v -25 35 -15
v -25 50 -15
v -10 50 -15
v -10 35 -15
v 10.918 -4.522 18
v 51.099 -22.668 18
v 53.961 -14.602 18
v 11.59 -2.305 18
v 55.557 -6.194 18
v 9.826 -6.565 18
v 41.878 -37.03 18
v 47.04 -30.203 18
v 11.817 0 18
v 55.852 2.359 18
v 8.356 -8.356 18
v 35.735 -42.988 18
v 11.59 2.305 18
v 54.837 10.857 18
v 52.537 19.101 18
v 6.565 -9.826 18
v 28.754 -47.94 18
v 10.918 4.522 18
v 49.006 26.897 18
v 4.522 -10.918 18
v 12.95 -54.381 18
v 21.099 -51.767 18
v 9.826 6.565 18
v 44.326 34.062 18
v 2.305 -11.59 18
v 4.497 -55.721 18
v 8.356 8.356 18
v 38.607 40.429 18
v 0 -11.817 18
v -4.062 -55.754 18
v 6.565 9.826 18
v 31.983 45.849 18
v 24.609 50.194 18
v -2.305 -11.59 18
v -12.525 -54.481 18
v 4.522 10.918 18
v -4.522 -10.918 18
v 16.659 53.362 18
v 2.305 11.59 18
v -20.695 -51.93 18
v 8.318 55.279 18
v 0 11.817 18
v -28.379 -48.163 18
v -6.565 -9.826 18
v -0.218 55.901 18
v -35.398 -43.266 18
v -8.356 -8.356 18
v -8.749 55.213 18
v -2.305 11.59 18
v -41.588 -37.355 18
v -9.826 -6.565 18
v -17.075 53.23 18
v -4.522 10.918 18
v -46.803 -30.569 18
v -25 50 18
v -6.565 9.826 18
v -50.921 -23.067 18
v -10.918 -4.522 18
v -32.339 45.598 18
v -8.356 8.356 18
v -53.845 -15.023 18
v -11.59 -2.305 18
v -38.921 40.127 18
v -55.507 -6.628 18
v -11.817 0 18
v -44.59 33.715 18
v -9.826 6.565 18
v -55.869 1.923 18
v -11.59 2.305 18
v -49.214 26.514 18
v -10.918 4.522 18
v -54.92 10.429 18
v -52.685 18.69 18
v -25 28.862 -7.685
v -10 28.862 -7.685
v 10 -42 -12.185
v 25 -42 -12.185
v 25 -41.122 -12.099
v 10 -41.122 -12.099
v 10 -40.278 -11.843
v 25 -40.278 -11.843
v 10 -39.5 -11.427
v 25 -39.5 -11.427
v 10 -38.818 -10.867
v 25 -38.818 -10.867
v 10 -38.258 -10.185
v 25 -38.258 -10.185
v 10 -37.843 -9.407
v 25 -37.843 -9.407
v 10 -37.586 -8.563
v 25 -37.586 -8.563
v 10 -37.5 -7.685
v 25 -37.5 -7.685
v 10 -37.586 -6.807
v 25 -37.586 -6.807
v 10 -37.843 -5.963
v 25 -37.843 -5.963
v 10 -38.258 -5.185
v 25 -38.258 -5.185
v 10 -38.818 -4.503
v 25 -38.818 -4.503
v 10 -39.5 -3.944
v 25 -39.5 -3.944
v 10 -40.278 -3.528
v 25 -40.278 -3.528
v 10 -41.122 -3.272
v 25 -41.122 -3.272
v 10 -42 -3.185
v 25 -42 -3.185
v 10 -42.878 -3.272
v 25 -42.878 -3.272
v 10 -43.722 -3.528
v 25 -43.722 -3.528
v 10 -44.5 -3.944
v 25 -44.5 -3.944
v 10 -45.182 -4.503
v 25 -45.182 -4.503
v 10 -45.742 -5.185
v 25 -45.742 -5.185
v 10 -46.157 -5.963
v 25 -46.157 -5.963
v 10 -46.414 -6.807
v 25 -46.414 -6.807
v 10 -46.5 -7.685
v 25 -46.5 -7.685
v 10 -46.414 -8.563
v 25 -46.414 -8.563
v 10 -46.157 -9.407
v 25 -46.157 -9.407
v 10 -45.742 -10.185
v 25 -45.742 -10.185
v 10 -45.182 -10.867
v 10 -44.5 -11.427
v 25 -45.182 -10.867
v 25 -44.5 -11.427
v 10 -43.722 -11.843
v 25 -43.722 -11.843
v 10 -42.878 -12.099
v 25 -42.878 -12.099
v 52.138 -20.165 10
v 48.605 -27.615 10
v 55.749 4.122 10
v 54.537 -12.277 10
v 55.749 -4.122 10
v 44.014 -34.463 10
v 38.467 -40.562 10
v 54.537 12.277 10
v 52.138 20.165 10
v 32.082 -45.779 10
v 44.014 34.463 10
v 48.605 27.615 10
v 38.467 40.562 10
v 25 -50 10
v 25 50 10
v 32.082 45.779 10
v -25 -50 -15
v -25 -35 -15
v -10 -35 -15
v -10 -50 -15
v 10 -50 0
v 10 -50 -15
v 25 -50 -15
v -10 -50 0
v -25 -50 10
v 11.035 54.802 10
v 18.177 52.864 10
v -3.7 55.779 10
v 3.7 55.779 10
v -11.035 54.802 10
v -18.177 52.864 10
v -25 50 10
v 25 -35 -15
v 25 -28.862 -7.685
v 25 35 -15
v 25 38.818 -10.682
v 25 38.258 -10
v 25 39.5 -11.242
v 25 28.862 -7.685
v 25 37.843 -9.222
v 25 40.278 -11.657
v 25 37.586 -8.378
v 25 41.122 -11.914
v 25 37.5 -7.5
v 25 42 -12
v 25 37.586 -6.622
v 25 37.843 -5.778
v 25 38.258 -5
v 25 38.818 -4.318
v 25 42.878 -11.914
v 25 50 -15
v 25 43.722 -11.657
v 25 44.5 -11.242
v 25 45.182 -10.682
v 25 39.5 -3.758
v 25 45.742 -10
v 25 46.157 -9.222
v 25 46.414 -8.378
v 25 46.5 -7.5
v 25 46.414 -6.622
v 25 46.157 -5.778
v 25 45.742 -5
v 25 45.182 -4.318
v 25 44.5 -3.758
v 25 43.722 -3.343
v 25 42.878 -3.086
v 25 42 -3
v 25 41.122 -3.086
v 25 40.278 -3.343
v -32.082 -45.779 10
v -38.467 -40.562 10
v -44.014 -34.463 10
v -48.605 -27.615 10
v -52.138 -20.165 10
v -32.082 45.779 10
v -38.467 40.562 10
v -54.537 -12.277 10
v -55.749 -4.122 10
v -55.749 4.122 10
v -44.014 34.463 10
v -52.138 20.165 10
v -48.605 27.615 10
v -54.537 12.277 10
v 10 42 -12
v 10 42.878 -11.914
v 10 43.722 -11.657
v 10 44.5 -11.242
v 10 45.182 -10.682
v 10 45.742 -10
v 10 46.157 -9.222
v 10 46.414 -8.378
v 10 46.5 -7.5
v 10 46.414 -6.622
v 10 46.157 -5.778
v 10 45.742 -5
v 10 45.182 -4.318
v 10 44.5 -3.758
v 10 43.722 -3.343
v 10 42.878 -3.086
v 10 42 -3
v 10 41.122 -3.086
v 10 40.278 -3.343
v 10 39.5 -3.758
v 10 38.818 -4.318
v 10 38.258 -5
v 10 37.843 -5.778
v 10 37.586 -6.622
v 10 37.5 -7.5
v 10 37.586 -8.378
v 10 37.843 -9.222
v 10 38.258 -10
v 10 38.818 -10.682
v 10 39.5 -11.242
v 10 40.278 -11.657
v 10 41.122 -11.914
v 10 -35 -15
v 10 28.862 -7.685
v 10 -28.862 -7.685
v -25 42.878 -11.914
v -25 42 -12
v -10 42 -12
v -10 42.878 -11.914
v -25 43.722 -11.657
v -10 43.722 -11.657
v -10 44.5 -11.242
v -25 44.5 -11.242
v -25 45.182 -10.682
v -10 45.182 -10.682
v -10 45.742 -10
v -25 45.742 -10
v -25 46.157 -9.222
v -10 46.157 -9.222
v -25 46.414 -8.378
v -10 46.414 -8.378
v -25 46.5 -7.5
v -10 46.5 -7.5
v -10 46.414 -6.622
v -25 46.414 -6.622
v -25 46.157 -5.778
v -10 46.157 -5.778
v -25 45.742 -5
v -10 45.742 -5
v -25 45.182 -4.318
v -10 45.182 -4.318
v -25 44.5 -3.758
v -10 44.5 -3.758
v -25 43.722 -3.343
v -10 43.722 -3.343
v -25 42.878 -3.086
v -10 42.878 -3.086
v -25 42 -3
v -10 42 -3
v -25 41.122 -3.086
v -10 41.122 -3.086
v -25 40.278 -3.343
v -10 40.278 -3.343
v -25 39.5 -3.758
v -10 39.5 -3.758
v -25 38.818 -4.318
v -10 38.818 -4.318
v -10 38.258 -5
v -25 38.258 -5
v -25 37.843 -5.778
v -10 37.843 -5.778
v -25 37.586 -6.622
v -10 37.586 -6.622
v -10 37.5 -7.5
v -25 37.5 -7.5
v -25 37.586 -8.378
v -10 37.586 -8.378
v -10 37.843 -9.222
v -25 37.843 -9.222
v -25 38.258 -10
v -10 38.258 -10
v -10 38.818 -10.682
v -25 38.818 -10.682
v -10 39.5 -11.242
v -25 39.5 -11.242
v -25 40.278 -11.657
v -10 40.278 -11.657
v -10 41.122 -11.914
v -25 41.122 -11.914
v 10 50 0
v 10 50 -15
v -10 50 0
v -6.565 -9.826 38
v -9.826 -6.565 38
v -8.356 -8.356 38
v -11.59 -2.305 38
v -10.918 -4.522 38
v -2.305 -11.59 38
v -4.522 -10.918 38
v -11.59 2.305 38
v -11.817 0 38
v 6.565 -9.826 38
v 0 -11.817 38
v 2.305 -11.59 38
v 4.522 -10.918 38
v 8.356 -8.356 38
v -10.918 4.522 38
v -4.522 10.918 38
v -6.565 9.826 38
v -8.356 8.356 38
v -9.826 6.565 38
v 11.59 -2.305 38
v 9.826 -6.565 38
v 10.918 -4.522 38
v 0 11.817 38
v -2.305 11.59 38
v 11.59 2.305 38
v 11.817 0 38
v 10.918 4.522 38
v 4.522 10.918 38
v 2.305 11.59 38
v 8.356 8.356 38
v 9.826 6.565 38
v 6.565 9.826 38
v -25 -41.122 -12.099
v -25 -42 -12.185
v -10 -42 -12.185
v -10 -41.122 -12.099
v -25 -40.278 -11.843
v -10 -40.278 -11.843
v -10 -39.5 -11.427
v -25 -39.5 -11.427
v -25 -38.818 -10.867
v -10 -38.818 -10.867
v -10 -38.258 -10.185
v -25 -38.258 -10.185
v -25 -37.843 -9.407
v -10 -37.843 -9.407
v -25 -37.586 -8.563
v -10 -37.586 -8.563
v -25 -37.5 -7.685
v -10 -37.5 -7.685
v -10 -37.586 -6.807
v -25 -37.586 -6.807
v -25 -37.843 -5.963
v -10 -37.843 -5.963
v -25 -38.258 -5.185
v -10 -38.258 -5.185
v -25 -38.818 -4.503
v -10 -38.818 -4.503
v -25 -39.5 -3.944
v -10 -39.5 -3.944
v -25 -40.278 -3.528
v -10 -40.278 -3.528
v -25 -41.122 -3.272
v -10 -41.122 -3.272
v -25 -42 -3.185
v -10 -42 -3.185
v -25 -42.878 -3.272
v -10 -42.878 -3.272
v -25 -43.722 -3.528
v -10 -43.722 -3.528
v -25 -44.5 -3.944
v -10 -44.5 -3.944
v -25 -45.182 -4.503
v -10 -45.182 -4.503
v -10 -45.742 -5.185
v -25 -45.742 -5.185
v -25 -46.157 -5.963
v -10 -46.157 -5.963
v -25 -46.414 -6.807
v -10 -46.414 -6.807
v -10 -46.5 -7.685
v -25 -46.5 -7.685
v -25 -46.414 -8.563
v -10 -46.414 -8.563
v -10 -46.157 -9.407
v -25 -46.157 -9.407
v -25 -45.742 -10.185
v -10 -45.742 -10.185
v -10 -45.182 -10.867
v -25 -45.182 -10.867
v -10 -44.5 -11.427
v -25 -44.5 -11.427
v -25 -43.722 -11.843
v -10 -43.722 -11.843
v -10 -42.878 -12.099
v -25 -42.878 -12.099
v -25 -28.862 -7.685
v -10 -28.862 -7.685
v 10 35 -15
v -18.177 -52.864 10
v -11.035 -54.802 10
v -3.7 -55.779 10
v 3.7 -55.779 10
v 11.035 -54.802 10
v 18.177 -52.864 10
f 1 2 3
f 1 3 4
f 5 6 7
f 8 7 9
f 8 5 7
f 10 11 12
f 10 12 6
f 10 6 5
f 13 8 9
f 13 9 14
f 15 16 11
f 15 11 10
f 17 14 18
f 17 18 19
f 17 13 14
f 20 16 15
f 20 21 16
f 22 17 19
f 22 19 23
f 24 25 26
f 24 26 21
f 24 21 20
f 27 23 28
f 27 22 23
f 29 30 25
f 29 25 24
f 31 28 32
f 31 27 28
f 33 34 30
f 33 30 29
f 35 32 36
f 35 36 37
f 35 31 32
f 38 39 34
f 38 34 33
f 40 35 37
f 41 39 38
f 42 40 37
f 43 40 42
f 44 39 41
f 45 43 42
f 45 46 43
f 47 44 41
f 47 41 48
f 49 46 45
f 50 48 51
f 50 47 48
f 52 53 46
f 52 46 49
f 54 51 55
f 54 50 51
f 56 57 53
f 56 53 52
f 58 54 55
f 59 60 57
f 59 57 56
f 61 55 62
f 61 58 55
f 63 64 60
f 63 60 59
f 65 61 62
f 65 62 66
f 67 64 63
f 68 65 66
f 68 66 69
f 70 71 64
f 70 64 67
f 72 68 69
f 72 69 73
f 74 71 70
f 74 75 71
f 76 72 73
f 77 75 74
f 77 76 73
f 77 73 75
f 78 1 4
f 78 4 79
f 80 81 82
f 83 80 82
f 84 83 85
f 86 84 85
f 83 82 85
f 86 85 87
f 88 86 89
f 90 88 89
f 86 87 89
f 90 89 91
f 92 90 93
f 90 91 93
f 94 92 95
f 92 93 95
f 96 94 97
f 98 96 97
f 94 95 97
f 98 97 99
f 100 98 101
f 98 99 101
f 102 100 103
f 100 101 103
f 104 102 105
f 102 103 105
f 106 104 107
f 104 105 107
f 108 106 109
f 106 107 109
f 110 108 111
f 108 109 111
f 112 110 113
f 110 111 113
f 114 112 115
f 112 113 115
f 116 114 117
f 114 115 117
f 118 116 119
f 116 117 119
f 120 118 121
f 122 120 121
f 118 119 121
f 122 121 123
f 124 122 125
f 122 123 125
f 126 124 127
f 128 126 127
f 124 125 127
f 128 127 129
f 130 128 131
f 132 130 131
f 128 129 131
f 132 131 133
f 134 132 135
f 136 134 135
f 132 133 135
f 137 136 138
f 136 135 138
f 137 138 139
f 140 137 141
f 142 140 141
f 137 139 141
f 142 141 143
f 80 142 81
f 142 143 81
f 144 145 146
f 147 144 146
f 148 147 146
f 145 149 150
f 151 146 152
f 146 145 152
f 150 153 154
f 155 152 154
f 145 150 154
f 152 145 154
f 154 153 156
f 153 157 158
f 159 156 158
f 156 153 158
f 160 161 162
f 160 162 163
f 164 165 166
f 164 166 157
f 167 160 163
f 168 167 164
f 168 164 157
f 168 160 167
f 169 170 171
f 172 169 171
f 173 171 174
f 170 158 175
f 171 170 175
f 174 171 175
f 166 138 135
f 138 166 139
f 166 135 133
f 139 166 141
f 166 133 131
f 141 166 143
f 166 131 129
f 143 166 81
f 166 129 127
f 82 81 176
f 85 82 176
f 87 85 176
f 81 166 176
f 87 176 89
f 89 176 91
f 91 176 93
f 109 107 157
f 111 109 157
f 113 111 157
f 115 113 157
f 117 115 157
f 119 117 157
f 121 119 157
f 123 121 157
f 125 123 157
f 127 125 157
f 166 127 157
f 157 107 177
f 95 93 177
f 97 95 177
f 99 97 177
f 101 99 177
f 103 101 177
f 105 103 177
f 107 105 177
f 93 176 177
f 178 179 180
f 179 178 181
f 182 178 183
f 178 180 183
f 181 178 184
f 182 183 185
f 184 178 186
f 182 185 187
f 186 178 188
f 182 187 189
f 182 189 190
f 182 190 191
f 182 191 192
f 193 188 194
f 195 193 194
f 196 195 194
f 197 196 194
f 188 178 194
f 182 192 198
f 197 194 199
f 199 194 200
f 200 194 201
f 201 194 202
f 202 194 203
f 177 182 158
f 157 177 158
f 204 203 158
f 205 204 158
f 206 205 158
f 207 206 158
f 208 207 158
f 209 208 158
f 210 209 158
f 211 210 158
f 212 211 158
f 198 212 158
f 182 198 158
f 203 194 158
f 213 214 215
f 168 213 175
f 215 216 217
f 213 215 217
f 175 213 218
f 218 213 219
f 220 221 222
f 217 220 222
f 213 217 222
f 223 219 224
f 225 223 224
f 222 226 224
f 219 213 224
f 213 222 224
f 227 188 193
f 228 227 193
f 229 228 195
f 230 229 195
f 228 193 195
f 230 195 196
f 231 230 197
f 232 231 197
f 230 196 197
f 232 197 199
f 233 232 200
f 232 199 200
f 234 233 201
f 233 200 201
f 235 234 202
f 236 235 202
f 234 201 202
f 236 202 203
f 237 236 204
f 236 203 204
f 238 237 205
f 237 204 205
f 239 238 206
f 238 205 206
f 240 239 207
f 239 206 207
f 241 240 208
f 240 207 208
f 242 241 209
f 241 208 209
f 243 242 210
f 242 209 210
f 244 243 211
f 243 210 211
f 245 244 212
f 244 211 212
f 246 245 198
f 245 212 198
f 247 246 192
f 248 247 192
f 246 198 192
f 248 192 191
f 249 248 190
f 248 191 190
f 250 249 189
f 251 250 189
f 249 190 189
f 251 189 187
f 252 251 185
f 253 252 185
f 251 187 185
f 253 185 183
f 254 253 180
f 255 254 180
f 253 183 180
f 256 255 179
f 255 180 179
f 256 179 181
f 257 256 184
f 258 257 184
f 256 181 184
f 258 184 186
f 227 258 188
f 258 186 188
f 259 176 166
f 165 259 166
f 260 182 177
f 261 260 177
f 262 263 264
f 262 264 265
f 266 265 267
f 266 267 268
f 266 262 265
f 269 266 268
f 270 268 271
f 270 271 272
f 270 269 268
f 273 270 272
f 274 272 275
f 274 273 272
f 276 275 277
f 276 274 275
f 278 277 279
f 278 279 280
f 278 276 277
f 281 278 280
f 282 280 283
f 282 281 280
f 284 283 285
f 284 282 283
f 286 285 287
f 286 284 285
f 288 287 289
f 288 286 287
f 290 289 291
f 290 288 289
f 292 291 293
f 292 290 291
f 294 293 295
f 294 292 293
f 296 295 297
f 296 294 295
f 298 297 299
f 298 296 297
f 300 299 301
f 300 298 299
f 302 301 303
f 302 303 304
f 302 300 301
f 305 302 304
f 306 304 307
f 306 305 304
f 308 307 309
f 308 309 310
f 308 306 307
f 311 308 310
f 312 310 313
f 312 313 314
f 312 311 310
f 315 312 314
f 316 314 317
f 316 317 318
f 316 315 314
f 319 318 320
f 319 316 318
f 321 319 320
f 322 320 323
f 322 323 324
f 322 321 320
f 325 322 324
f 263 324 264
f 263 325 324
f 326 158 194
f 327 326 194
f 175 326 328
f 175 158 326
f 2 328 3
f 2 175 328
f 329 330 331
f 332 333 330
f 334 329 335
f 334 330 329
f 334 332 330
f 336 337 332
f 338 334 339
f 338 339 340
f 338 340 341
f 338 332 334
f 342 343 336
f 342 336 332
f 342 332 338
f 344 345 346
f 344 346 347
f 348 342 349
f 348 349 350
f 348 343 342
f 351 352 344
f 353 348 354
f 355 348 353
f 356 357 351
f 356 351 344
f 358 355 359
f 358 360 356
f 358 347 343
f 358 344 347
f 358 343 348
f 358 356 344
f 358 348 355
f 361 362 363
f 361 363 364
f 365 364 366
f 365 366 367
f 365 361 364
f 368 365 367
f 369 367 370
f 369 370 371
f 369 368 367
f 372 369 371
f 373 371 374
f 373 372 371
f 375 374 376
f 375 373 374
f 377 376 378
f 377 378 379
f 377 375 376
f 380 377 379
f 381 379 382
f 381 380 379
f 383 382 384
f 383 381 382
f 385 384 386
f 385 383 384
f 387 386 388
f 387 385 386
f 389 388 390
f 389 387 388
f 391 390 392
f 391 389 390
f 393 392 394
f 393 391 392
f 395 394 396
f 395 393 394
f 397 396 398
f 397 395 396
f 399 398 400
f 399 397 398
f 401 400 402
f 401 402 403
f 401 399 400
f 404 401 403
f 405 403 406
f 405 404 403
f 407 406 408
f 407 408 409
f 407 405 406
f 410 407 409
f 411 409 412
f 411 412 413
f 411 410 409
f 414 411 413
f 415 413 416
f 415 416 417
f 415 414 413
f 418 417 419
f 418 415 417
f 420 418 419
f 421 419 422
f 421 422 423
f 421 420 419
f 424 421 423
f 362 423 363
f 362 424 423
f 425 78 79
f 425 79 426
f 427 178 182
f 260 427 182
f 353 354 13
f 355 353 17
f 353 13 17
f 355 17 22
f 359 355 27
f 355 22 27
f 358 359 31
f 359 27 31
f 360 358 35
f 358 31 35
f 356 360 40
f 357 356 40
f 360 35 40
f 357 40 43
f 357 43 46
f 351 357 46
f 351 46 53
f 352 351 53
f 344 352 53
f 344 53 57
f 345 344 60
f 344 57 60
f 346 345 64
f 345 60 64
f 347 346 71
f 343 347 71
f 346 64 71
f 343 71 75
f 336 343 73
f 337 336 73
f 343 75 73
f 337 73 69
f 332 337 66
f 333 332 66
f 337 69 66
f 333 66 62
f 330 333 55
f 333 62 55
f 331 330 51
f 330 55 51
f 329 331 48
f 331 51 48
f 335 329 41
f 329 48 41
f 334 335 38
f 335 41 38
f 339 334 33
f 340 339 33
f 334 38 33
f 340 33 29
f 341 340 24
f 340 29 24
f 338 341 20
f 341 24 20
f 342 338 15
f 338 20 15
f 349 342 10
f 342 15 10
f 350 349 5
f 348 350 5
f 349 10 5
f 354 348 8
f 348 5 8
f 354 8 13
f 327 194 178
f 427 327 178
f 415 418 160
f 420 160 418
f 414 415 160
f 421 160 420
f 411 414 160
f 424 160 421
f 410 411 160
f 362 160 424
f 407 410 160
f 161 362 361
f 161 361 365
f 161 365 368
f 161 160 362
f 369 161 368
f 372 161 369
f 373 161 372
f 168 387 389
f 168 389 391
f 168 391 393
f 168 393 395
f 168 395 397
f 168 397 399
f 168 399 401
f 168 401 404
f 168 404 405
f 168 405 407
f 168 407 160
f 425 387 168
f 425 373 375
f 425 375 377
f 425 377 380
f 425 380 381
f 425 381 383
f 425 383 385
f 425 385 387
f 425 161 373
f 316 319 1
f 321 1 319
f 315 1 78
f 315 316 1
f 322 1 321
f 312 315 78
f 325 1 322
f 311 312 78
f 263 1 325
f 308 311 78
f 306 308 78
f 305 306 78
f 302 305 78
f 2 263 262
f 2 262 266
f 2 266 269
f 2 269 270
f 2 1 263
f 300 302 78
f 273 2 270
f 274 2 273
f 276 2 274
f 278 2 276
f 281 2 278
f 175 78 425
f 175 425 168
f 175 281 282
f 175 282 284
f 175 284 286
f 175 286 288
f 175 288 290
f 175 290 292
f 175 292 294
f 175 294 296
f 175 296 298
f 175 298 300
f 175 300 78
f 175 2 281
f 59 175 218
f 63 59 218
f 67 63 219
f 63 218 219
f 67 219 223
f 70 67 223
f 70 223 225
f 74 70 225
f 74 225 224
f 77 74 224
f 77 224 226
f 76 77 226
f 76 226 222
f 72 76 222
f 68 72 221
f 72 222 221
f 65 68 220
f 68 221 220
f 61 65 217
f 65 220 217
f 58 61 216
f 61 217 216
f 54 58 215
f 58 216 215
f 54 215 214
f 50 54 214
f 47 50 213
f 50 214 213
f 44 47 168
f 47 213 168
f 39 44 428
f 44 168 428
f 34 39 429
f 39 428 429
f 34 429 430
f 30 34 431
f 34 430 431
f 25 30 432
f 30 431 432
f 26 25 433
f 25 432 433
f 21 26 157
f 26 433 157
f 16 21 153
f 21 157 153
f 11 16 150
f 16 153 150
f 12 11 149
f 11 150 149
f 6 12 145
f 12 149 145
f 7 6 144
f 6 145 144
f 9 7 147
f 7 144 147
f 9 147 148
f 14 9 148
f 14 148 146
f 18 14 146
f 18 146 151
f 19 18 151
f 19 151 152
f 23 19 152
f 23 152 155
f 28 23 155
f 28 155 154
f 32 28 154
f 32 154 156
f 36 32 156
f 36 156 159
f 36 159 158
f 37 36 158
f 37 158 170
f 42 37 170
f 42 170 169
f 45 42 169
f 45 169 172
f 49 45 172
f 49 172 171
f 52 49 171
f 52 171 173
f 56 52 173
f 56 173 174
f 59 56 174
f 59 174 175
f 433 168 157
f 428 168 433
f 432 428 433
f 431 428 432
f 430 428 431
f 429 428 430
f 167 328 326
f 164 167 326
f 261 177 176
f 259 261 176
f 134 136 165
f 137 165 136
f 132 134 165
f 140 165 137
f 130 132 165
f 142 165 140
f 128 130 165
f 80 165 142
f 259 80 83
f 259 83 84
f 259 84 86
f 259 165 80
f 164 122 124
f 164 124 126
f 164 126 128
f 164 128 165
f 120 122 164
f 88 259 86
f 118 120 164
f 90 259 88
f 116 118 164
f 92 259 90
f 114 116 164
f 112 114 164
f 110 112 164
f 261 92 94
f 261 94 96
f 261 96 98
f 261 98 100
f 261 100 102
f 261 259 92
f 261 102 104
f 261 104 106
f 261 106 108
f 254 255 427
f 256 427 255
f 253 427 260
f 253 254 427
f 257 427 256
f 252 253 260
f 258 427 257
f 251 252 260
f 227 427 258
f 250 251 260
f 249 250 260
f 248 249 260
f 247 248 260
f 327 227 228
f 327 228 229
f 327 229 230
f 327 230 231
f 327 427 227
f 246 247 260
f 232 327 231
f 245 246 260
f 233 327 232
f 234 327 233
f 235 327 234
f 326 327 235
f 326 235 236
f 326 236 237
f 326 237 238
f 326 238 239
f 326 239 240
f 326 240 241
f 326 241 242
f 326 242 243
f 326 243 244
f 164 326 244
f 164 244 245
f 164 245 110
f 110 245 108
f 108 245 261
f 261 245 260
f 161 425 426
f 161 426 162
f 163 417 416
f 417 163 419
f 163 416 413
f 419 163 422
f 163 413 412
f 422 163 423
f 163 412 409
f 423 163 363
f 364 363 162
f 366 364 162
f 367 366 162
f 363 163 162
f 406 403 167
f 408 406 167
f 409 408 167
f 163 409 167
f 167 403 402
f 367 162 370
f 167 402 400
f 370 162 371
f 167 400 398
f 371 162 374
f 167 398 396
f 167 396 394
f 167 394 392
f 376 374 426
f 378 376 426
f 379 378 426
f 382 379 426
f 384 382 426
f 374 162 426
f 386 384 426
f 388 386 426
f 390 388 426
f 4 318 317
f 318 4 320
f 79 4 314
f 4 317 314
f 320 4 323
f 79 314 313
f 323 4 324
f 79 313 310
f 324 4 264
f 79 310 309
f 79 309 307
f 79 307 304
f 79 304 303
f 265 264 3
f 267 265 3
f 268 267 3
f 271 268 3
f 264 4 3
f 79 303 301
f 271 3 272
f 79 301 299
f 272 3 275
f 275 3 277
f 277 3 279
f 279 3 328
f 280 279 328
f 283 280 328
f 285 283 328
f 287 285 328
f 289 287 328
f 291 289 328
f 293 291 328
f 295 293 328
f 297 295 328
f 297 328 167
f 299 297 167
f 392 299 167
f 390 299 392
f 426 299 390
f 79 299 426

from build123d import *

# Parameters (mm, degrees)
SKETCH1_W           = 50
SKETCH1_H           = 100
BOSS_EXTRUDE1_DEPTH = 10
SKETCH10_R          = 4.5
BOSS_EXTRUDE2_DEPTH = 15
SKETCH11_R          = 55.901699437
BOSS_EXTRUDE3_DEPTH = 8
SKETCH13_R          = 11.817212027
BOSS_EXTRUDE4_DEPTH = 20


with BuildPart() as part:
    # Sketch1 → Boss-Extrude1 (new body)
    with BuildSketch(Plane.XY):
        Rectangle(SKETCH1_W, SKETCH1_H)
    extrude(amount=BOSS_EXTRUDE1_DEPTH)

    # Sketch10 → Boss-Extrude2 (add)
    with BuildSketch(Plane(origin=(25, 0, 0), x_dir=(0, 0, -1), z_dir=(1, 0, 0))):
        Polygon((0, 50), (15, 50), (15, 35), (7.685229658, 28.862178904), (7.685229658, -28.862178904), (15, -35), (15, -50), (0, -50), align=None)
        with Locations((7.5, 42)):
            Circle(SKETCH10_R, mode=Mode.SUBTRACT)
        with Locations((7.685229658, -42)):
            Circle(SKETCH10_R, mode=Mode.SUBTRACT)
    boss_extrude2 = extrude(amount=-BOSS_EXTRUDE2_DEPTH)

    # Mirror1: Boss-Extrude2 across plane
    add(boss_extrude2.mirror(Plane(origin=(0, 0, 0), x_dir=(0, 0, 1), z_dir=(1, 0, 0))))

    # Sketch11 → Boss-Extrude3 (add)
    with BuildSketch(Plane.XY.offset(10)):
        with Locations(Location((0, 0, 0), (0, 0, 116.565051177))):
            Circle(SKETCH11_R)
    extrude(amount=BOSS_EXTRUDE3_DEPTH)

    # Sketch13 → Boss-Extrude4 (add)
    with BuildSketch(Plane.XY.offset(18)):
        Circle(SKETCH13_R)
    extrude(amount=BOSS_EXTRUDE4_DEPTH)


solid = part.part
